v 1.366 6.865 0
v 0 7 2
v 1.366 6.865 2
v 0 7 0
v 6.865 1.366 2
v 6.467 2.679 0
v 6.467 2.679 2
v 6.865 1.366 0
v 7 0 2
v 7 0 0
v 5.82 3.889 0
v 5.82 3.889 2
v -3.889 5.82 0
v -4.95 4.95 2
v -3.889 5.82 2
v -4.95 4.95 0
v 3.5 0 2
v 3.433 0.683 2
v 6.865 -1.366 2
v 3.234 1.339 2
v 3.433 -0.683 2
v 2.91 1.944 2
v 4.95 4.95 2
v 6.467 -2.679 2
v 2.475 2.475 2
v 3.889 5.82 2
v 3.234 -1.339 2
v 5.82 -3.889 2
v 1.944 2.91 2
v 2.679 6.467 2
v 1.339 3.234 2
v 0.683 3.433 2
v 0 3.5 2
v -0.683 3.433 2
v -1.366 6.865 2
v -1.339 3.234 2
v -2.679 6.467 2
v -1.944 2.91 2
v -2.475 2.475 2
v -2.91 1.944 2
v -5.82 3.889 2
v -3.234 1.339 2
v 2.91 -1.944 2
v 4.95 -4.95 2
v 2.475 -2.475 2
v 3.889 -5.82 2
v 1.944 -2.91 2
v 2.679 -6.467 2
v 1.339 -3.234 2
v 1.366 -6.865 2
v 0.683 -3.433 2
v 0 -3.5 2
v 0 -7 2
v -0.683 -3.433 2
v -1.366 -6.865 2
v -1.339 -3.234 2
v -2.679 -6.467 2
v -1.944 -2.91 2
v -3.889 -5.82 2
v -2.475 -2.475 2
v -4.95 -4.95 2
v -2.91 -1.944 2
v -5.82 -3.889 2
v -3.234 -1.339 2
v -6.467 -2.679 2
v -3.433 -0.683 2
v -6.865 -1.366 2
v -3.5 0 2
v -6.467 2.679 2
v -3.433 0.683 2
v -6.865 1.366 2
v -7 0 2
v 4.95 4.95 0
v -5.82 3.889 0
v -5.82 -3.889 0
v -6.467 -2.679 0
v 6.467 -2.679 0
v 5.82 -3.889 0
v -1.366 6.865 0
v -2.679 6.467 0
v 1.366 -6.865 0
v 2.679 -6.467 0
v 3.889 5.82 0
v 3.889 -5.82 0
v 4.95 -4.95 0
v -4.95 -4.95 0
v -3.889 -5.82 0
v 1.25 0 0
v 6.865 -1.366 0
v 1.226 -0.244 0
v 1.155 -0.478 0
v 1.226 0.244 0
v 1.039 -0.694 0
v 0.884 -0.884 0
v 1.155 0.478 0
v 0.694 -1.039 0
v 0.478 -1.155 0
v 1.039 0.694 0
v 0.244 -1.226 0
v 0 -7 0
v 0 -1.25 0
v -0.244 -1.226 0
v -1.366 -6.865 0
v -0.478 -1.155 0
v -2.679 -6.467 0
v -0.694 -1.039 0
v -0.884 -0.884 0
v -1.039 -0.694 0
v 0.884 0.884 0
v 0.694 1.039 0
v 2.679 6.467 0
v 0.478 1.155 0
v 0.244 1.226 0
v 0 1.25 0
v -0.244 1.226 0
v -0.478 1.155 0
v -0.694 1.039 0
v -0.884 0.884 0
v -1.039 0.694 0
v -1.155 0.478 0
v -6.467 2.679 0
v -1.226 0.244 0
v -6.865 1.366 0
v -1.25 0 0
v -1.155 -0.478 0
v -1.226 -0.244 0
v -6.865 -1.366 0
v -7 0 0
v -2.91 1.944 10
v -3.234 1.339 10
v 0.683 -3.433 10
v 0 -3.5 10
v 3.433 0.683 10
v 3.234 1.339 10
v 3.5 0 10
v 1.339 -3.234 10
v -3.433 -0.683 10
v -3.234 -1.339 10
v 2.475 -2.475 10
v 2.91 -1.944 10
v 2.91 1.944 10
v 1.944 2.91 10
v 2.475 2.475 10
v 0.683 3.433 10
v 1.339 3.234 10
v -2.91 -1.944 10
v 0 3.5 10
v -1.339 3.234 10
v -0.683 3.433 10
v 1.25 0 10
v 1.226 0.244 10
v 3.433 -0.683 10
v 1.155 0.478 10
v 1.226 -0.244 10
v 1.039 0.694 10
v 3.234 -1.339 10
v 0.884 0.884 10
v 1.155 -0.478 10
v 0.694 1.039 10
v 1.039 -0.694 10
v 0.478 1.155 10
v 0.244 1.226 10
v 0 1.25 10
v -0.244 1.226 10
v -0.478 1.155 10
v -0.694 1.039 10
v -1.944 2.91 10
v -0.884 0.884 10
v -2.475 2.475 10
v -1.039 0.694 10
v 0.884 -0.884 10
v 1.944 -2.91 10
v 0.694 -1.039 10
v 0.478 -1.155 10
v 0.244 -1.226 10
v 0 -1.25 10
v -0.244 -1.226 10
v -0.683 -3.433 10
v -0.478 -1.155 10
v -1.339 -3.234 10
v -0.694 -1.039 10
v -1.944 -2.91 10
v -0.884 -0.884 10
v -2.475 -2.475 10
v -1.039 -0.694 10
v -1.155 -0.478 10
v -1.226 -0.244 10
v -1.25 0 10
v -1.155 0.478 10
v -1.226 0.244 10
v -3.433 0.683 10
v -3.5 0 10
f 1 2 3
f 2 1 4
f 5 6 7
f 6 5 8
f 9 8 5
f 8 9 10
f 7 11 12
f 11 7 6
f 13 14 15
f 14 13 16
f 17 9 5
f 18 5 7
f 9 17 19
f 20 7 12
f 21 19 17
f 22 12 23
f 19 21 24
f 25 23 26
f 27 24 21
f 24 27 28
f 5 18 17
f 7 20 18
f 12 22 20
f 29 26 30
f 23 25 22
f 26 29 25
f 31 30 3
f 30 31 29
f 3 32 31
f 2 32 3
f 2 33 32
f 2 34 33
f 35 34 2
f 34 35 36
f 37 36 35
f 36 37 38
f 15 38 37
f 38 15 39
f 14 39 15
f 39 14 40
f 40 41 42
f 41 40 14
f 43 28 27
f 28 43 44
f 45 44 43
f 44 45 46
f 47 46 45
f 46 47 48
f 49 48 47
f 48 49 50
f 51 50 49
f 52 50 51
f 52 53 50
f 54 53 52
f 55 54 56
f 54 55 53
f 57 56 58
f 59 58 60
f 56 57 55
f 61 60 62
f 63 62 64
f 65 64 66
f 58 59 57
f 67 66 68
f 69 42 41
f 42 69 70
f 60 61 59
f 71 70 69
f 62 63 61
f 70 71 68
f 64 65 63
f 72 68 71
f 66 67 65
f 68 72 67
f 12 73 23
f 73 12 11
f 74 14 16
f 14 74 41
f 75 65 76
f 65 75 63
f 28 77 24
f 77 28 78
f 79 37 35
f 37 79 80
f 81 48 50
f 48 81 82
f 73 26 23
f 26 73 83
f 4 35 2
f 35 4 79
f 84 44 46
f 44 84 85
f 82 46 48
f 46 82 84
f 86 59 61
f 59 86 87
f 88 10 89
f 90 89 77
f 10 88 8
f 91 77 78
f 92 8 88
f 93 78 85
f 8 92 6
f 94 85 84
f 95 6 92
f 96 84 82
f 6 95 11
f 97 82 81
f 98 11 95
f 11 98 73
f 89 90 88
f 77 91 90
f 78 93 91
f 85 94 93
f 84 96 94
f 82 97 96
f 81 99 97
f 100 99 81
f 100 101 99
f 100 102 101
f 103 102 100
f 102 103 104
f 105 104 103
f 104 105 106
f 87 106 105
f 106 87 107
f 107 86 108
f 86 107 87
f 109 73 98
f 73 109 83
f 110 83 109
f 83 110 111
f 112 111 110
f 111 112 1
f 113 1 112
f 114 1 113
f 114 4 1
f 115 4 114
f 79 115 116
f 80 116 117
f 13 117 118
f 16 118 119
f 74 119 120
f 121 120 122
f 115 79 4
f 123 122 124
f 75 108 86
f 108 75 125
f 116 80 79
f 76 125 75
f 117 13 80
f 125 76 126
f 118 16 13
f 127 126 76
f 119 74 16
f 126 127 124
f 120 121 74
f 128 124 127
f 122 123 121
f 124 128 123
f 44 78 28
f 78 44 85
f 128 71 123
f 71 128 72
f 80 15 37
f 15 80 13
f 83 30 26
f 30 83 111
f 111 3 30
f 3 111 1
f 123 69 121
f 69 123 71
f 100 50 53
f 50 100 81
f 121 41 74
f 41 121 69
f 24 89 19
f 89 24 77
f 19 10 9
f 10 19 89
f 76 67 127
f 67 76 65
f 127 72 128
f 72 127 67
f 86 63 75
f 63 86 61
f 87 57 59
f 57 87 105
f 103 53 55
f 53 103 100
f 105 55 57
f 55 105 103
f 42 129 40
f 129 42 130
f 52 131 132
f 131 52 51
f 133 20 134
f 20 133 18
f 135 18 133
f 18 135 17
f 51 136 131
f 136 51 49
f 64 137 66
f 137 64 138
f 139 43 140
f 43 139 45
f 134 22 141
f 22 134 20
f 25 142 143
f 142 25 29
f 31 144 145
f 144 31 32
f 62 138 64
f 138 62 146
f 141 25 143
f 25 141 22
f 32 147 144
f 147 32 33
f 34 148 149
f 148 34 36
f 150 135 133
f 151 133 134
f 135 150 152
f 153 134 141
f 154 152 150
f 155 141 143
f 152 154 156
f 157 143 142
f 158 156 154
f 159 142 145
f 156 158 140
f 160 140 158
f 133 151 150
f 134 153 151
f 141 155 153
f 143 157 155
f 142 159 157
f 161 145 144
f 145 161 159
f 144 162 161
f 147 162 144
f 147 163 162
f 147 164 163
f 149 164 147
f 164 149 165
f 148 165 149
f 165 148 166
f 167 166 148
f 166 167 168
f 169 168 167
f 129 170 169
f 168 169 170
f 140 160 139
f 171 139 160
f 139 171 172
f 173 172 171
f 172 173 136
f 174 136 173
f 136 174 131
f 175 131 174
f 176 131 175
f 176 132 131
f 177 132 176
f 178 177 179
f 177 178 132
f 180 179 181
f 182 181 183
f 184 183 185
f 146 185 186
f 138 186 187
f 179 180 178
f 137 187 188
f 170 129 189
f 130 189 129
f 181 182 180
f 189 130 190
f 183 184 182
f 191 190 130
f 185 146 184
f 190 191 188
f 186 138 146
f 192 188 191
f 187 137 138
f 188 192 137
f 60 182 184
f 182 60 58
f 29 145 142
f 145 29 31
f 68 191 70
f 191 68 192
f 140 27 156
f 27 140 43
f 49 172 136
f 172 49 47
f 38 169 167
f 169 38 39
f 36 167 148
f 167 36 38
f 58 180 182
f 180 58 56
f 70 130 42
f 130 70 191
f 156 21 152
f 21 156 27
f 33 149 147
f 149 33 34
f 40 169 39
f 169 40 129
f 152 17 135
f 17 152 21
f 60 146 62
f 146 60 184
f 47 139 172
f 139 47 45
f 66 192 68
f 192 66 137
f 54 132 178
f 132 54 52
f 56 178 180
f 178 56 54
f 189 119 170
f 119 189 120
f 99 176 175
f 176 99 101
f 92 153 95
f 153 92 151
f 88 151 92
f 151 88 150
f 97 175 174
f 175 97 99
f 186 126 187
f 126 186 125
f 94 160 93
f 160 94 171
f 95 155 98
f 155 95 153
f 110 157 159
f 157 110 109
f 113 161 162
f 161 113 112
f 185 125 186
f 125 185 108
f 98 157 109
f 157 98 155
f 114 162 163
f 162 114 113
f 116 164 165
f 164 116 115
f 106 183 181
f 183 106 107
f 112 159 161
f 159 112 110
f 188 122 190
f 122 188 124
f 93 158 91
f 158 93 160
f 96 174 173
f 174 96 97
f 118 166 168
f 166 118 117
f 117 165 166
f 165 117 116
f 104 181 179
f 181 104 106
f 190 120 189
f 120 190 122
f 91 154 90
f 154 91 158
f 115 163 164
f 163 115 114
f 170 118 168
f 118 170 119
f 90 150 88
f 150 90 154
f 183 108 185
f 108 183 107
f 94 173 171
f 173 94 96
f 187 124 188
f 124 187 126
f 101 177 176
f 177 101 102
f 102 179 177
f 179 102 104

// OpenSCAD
$fn = 32;

// ----------------------------------------------------------------------
// Micro post: flanged post, 5-20 mm class
// ----------------------------------------------------------------------

// --- parameters (mm) ---
post_d = 7;               // post diameter
post_h = 8;               // post height above the flange
flange_d = 14;            // flange diameter
flange_t = 2;             // flange thickness
bore_d = 2.5;             // through bore

total_h = post_h + flange_t;  // overall height

difference() {
  union() {
    cylinder(h = flange_t, d = flange_d);
    translate([0, 0, flange_t]) cylinder(h = post_h, d = post_d);
  }
  translate([0, 0, -1]) cylinder(h = total_h + 2, d = bore_d);
}
